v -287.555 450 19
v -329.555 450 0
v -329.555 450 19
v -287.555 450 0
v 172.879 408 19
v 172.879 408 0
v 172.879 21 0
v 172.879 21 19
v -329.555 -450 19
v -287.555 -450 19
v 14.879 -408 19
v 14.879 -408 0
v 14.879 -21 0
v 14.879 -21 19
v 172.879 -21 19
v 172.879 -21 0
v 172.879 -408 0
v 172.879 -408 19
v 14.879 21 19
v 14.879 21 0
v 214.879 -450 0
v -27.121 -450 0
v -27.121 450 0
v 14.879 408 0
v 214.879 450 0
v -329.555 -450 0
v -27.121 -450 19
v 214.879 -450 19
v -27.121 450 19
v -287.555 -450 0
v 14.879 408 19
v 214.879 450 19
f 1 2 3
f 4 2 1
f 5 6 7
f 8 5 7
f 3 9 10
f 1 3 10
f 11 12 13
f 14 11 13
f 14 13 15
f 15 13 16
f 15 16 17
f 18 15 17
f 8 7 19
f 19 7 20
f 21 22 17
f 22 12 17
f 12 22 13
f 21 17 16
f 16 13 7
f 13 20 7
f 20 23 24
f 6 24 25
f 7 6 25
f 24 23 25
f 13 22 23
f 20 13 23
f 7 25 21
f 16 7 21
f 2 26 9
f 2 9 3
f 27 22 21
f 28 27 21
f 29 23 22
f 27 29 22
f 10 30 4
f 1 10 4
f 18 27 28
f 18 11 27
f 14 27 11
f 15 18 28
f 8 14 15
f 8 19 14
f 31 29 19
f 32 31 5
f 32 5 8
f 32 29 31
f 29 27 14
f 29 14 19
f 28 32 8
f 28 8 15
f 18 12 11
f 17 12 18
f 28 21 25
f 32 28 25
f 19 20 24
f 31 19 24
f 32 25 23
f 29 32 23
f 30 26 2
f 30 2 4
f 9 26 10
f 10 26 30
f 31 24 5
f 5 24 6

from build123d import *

# Parameters (mm, degrees)
F0_W     = 158
F0_H     = 42
F1_DEPTH = 19
F2_W     = 42
F2_H     = 900
F3_DEPTH = 19


with BuildPart() as f1:
    # F0 (on Top) → F1 (new body)
    with BuildSketch(Plane.XY):
        Polygon((172.878919, 408), (172.878919, 21), (172.878919, 0), (214.878919, 0), (214.878919, 450), (172.878919, 450), align=None)
        Polygon((14.878919, 0), (14.878919, 21), (14.878919, 408), (14.878919, 450), (-27.121081, 450), (-27.121081, 0), align=None)
        Polygon((214.878919, 0), (172.878919, 0), (172.878919, -21), (172.878919, -408), (172.878919, -450), (214.878919, -450), align=None)
        with Locations((93.878919, 429)):
            Rectangle(F0_W, F0_H)
        Polygon((14.878919, -21), (14.878919, 0), (-27.121081, 0), (-27.121081, -450), (14.878919, -450), (14.878919, -408), align=None)
        with Locations((93.878919, -429)):
            Rectangle(F0_W, F0_H)
        Polygon((172.878919, 0), (172.878919, 21), (14.878919, 21), (14.878919, 0), (14.878919, -21), (172.878919, -21), align=None)
    extrude(amount=F1_DEPTH)


with BuildPart() as f3:
    # F2 (on Top) → F3 (new body)
    with BuildSketch(Plane.XY):
        with Locations((-308.554617, 0)):
            Rectangle(F2_W, F2_H)
    extrude(amount=F3_DEPTH)


solid = Compound([f1.part, f3.part])
